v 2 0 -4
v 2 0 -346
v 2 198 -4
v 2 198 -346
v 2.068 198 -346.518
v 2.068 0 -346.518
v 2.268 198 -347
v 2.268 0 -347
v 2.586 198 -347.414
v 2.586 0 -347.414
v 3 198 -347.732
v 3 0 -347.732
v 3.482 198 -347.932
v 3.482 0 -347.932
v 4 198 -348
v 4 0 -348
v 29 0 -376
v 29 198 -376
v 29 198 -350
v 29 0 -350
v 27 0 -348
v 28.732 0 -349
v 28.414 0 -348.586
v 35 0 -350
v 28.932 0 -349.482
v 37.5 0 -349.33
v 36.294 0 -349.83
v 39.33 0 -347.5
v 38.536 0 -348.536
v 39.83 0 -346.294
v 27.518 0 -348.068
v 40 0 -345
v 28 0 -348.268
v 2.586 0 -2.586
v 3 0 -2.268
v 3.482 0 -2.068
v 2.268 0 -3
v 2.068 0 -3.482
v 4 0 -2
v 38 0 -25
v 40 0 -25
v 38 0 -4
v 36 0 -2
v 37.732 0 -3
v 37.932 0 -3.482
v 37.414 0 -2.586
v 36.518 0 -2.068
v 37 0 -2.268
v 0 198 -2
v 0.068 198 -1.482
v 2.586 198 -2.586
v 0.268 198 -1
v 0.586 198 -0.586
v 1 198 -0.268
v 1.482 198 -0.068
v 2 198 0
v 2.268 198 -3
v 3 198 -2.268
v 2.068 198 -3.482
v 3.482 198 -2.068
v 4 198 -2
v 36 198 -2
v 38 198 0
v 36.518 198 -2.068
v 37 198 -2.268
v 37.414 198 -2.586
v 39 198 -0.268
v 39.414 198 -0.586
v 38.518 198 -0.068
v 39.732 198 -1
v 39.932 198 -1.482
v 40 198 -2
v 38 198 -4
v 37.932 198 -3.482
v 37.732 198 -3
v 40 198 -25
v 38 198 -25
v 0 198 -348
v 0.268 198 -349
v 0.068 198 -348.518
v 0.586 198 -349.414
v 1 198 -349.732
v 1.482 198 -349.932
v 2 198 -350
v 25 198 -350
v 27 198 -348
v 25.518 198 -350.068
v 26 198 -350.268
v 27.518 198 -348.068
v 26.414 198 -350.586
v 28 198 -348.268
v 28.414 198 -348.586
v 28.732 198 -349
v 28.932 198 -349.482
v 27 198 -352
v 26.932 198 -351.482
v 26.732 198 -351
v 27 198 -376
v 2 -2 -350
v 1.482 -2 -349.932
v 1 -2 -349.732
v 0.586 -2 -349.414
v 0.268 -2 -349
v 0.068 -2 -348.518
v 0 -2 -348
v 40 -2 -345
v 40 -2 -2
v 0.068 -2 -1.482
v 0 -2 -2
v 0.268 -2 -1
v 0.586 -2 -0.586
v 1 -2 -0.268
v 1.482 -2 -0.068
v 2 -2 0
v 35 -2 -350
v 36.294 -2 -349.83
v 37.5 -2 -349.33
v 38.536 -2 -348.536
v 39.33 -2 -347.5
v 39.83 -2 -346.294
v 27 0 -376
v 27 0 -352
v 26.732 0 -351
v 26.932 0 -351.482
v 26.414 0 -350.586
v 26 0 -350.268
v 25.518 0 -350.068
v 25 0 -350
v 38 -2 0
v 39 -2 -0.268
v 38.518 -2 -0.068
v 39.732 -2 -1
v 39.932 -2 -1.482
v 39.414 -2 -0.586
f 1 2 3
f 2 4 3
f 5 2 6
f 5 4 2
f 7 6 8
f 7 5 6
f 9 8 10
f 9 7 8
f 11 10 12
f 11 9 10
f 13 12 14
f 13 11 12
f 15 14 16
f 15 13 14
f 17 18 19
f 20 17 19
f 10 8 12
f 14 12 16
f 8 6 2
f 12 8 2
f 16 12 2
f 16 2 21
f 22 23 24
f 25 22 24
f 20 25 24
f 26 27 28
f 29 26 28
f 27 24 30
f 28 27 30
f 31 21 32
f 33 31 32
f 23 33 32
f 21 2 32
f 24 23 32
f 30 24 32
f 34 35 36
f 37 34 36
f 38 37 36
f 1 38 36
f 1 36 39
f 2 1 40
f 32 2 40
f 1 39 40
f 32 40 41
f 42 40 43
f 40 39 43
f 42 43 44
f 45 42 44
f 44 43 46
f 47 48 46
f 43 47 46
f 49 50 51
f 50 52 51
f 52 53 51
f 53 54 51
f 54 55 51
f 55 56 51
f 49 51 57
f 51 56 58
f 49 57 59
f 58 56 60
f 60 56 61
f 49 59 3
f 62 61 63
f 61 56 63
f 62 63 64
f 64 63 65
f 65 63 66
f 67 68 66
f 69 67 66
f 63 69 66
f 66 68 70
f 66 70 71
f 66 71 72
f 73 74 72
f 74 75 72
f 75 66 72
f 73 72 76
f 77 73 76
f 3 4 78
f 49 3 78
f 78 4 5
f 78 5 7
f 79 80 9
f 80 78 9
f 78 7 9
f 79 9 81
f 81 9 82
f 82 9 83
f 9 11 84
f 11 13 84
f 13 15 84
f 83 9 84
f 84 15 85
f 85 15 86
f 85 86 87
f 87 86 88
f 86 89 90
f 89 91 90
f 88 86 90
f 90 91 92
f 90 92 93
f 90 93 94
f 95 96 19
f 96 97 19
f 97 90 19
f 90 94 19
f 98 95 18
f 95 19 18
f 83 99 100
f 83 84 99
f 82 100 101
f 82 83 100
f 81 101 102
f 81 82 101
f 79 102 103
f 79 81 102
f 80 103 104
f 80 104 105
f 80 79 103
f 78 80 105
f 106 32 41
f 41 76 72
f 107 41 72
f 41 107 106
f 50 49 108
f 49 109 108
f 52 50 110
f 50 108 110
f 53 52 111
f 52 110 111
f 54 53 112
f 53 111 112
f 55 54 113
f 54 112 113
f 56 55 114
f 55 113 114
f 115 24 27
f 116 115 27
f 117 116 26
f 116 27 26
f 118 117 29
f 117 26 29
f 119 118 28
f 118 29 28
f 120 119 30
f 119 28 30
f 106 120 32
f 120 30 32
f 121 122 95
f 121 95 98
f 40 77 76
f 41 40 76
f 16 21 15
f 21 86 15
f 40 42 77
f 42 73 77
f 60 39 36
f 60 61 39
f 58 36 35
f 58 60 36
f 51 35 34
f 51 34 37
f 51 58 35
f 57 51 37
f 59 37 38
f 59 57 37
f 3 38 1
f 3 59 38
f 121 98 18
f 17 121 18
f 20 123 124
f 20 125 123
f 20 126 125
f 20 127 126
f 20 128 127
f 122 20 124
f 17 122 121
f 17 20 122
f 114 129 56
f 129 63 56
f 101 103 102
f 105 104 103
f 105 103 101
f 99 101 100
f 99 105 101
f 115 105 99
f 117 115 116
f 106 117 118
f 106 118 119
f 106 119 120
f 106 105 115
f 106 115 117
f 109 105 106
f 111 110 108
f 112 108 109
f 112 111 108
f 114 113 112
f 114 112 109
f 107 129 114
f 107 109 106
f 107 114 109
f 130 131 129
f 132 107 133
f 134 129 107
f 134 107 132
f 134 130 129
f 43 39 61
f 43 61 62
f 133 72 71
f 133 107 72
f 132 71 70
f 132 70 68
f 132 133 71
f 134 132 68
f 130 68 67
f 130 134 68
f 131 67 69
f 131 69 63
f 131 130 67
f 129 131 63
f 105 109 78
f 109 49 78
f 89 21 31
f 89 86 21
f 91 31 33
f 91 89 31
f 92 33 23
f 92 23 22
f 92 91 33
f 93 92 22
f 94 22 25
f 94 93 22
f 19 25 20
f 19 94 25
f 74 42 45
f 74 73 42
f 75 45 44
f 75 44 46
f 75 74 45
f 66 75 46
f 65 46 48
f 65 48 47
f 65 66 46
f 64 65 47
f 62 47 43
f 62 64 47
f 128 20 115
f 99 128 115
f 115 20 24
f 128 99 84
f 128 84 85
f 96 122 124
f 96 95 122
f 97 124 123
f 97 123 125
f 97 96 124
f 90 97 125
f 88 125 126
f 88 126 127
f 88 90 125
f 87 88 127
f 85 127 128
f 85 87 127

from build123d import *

# Parameters (mm, degrees)
F4_DEPTH = 2
F6_R     = 2


with BuildPart() as f2:
    # F2: sweep along a path in F1
    with BuildLine(Plane.XY) as f2_path:
        Line((0, 0), (0, 198))
    # F0 (on Front) → F2 (sweep)
    with BuildSketch(Plane.XZ):
        Polygon((40, 0), (0, 0), (0, -350), (27, -350), (27, -376), (29, -376), (29, -348), (2, -348), (2, -2), (38, -2), (38, -25), (40, -25), align=None)
    sweep(path=f2_path.line)


with BuildPart() as f4:
    # F3 (on face) → F4 (new body)
    with BuildSketch(Plane.XZ):
        with BuildLine():
            Line((40, -345), (40, 0))
            Line((40, 0), (0, 0))
            Line((0, 0), (0, -350))
            Line((0, -350), (35, -350))
            ThreePointArc((35, -350), (38.5355339059, -348.5355339059), (40, -345))
        make_face()
    extrude(amount=F4_DEPTH)


with BuildPart() as f2_1:
    add(f2.part)

    # F5: union F4
    add(f4.part)

    # F6
    f6_edges = [f2_1.edges().sort_by_distance(p)[0] for p in [
        (40, 98, 0),
        (0, 98, 0),
        (0, 98, -350),
        (29, 99, -348),
        (27, 99, -350),
        (2, 99, -348),
        (2, 99, -2),
        (38, 99, -2),
    ]]
    fillet(f6_edges, radius=F6_R)


solid = f2_1.part
